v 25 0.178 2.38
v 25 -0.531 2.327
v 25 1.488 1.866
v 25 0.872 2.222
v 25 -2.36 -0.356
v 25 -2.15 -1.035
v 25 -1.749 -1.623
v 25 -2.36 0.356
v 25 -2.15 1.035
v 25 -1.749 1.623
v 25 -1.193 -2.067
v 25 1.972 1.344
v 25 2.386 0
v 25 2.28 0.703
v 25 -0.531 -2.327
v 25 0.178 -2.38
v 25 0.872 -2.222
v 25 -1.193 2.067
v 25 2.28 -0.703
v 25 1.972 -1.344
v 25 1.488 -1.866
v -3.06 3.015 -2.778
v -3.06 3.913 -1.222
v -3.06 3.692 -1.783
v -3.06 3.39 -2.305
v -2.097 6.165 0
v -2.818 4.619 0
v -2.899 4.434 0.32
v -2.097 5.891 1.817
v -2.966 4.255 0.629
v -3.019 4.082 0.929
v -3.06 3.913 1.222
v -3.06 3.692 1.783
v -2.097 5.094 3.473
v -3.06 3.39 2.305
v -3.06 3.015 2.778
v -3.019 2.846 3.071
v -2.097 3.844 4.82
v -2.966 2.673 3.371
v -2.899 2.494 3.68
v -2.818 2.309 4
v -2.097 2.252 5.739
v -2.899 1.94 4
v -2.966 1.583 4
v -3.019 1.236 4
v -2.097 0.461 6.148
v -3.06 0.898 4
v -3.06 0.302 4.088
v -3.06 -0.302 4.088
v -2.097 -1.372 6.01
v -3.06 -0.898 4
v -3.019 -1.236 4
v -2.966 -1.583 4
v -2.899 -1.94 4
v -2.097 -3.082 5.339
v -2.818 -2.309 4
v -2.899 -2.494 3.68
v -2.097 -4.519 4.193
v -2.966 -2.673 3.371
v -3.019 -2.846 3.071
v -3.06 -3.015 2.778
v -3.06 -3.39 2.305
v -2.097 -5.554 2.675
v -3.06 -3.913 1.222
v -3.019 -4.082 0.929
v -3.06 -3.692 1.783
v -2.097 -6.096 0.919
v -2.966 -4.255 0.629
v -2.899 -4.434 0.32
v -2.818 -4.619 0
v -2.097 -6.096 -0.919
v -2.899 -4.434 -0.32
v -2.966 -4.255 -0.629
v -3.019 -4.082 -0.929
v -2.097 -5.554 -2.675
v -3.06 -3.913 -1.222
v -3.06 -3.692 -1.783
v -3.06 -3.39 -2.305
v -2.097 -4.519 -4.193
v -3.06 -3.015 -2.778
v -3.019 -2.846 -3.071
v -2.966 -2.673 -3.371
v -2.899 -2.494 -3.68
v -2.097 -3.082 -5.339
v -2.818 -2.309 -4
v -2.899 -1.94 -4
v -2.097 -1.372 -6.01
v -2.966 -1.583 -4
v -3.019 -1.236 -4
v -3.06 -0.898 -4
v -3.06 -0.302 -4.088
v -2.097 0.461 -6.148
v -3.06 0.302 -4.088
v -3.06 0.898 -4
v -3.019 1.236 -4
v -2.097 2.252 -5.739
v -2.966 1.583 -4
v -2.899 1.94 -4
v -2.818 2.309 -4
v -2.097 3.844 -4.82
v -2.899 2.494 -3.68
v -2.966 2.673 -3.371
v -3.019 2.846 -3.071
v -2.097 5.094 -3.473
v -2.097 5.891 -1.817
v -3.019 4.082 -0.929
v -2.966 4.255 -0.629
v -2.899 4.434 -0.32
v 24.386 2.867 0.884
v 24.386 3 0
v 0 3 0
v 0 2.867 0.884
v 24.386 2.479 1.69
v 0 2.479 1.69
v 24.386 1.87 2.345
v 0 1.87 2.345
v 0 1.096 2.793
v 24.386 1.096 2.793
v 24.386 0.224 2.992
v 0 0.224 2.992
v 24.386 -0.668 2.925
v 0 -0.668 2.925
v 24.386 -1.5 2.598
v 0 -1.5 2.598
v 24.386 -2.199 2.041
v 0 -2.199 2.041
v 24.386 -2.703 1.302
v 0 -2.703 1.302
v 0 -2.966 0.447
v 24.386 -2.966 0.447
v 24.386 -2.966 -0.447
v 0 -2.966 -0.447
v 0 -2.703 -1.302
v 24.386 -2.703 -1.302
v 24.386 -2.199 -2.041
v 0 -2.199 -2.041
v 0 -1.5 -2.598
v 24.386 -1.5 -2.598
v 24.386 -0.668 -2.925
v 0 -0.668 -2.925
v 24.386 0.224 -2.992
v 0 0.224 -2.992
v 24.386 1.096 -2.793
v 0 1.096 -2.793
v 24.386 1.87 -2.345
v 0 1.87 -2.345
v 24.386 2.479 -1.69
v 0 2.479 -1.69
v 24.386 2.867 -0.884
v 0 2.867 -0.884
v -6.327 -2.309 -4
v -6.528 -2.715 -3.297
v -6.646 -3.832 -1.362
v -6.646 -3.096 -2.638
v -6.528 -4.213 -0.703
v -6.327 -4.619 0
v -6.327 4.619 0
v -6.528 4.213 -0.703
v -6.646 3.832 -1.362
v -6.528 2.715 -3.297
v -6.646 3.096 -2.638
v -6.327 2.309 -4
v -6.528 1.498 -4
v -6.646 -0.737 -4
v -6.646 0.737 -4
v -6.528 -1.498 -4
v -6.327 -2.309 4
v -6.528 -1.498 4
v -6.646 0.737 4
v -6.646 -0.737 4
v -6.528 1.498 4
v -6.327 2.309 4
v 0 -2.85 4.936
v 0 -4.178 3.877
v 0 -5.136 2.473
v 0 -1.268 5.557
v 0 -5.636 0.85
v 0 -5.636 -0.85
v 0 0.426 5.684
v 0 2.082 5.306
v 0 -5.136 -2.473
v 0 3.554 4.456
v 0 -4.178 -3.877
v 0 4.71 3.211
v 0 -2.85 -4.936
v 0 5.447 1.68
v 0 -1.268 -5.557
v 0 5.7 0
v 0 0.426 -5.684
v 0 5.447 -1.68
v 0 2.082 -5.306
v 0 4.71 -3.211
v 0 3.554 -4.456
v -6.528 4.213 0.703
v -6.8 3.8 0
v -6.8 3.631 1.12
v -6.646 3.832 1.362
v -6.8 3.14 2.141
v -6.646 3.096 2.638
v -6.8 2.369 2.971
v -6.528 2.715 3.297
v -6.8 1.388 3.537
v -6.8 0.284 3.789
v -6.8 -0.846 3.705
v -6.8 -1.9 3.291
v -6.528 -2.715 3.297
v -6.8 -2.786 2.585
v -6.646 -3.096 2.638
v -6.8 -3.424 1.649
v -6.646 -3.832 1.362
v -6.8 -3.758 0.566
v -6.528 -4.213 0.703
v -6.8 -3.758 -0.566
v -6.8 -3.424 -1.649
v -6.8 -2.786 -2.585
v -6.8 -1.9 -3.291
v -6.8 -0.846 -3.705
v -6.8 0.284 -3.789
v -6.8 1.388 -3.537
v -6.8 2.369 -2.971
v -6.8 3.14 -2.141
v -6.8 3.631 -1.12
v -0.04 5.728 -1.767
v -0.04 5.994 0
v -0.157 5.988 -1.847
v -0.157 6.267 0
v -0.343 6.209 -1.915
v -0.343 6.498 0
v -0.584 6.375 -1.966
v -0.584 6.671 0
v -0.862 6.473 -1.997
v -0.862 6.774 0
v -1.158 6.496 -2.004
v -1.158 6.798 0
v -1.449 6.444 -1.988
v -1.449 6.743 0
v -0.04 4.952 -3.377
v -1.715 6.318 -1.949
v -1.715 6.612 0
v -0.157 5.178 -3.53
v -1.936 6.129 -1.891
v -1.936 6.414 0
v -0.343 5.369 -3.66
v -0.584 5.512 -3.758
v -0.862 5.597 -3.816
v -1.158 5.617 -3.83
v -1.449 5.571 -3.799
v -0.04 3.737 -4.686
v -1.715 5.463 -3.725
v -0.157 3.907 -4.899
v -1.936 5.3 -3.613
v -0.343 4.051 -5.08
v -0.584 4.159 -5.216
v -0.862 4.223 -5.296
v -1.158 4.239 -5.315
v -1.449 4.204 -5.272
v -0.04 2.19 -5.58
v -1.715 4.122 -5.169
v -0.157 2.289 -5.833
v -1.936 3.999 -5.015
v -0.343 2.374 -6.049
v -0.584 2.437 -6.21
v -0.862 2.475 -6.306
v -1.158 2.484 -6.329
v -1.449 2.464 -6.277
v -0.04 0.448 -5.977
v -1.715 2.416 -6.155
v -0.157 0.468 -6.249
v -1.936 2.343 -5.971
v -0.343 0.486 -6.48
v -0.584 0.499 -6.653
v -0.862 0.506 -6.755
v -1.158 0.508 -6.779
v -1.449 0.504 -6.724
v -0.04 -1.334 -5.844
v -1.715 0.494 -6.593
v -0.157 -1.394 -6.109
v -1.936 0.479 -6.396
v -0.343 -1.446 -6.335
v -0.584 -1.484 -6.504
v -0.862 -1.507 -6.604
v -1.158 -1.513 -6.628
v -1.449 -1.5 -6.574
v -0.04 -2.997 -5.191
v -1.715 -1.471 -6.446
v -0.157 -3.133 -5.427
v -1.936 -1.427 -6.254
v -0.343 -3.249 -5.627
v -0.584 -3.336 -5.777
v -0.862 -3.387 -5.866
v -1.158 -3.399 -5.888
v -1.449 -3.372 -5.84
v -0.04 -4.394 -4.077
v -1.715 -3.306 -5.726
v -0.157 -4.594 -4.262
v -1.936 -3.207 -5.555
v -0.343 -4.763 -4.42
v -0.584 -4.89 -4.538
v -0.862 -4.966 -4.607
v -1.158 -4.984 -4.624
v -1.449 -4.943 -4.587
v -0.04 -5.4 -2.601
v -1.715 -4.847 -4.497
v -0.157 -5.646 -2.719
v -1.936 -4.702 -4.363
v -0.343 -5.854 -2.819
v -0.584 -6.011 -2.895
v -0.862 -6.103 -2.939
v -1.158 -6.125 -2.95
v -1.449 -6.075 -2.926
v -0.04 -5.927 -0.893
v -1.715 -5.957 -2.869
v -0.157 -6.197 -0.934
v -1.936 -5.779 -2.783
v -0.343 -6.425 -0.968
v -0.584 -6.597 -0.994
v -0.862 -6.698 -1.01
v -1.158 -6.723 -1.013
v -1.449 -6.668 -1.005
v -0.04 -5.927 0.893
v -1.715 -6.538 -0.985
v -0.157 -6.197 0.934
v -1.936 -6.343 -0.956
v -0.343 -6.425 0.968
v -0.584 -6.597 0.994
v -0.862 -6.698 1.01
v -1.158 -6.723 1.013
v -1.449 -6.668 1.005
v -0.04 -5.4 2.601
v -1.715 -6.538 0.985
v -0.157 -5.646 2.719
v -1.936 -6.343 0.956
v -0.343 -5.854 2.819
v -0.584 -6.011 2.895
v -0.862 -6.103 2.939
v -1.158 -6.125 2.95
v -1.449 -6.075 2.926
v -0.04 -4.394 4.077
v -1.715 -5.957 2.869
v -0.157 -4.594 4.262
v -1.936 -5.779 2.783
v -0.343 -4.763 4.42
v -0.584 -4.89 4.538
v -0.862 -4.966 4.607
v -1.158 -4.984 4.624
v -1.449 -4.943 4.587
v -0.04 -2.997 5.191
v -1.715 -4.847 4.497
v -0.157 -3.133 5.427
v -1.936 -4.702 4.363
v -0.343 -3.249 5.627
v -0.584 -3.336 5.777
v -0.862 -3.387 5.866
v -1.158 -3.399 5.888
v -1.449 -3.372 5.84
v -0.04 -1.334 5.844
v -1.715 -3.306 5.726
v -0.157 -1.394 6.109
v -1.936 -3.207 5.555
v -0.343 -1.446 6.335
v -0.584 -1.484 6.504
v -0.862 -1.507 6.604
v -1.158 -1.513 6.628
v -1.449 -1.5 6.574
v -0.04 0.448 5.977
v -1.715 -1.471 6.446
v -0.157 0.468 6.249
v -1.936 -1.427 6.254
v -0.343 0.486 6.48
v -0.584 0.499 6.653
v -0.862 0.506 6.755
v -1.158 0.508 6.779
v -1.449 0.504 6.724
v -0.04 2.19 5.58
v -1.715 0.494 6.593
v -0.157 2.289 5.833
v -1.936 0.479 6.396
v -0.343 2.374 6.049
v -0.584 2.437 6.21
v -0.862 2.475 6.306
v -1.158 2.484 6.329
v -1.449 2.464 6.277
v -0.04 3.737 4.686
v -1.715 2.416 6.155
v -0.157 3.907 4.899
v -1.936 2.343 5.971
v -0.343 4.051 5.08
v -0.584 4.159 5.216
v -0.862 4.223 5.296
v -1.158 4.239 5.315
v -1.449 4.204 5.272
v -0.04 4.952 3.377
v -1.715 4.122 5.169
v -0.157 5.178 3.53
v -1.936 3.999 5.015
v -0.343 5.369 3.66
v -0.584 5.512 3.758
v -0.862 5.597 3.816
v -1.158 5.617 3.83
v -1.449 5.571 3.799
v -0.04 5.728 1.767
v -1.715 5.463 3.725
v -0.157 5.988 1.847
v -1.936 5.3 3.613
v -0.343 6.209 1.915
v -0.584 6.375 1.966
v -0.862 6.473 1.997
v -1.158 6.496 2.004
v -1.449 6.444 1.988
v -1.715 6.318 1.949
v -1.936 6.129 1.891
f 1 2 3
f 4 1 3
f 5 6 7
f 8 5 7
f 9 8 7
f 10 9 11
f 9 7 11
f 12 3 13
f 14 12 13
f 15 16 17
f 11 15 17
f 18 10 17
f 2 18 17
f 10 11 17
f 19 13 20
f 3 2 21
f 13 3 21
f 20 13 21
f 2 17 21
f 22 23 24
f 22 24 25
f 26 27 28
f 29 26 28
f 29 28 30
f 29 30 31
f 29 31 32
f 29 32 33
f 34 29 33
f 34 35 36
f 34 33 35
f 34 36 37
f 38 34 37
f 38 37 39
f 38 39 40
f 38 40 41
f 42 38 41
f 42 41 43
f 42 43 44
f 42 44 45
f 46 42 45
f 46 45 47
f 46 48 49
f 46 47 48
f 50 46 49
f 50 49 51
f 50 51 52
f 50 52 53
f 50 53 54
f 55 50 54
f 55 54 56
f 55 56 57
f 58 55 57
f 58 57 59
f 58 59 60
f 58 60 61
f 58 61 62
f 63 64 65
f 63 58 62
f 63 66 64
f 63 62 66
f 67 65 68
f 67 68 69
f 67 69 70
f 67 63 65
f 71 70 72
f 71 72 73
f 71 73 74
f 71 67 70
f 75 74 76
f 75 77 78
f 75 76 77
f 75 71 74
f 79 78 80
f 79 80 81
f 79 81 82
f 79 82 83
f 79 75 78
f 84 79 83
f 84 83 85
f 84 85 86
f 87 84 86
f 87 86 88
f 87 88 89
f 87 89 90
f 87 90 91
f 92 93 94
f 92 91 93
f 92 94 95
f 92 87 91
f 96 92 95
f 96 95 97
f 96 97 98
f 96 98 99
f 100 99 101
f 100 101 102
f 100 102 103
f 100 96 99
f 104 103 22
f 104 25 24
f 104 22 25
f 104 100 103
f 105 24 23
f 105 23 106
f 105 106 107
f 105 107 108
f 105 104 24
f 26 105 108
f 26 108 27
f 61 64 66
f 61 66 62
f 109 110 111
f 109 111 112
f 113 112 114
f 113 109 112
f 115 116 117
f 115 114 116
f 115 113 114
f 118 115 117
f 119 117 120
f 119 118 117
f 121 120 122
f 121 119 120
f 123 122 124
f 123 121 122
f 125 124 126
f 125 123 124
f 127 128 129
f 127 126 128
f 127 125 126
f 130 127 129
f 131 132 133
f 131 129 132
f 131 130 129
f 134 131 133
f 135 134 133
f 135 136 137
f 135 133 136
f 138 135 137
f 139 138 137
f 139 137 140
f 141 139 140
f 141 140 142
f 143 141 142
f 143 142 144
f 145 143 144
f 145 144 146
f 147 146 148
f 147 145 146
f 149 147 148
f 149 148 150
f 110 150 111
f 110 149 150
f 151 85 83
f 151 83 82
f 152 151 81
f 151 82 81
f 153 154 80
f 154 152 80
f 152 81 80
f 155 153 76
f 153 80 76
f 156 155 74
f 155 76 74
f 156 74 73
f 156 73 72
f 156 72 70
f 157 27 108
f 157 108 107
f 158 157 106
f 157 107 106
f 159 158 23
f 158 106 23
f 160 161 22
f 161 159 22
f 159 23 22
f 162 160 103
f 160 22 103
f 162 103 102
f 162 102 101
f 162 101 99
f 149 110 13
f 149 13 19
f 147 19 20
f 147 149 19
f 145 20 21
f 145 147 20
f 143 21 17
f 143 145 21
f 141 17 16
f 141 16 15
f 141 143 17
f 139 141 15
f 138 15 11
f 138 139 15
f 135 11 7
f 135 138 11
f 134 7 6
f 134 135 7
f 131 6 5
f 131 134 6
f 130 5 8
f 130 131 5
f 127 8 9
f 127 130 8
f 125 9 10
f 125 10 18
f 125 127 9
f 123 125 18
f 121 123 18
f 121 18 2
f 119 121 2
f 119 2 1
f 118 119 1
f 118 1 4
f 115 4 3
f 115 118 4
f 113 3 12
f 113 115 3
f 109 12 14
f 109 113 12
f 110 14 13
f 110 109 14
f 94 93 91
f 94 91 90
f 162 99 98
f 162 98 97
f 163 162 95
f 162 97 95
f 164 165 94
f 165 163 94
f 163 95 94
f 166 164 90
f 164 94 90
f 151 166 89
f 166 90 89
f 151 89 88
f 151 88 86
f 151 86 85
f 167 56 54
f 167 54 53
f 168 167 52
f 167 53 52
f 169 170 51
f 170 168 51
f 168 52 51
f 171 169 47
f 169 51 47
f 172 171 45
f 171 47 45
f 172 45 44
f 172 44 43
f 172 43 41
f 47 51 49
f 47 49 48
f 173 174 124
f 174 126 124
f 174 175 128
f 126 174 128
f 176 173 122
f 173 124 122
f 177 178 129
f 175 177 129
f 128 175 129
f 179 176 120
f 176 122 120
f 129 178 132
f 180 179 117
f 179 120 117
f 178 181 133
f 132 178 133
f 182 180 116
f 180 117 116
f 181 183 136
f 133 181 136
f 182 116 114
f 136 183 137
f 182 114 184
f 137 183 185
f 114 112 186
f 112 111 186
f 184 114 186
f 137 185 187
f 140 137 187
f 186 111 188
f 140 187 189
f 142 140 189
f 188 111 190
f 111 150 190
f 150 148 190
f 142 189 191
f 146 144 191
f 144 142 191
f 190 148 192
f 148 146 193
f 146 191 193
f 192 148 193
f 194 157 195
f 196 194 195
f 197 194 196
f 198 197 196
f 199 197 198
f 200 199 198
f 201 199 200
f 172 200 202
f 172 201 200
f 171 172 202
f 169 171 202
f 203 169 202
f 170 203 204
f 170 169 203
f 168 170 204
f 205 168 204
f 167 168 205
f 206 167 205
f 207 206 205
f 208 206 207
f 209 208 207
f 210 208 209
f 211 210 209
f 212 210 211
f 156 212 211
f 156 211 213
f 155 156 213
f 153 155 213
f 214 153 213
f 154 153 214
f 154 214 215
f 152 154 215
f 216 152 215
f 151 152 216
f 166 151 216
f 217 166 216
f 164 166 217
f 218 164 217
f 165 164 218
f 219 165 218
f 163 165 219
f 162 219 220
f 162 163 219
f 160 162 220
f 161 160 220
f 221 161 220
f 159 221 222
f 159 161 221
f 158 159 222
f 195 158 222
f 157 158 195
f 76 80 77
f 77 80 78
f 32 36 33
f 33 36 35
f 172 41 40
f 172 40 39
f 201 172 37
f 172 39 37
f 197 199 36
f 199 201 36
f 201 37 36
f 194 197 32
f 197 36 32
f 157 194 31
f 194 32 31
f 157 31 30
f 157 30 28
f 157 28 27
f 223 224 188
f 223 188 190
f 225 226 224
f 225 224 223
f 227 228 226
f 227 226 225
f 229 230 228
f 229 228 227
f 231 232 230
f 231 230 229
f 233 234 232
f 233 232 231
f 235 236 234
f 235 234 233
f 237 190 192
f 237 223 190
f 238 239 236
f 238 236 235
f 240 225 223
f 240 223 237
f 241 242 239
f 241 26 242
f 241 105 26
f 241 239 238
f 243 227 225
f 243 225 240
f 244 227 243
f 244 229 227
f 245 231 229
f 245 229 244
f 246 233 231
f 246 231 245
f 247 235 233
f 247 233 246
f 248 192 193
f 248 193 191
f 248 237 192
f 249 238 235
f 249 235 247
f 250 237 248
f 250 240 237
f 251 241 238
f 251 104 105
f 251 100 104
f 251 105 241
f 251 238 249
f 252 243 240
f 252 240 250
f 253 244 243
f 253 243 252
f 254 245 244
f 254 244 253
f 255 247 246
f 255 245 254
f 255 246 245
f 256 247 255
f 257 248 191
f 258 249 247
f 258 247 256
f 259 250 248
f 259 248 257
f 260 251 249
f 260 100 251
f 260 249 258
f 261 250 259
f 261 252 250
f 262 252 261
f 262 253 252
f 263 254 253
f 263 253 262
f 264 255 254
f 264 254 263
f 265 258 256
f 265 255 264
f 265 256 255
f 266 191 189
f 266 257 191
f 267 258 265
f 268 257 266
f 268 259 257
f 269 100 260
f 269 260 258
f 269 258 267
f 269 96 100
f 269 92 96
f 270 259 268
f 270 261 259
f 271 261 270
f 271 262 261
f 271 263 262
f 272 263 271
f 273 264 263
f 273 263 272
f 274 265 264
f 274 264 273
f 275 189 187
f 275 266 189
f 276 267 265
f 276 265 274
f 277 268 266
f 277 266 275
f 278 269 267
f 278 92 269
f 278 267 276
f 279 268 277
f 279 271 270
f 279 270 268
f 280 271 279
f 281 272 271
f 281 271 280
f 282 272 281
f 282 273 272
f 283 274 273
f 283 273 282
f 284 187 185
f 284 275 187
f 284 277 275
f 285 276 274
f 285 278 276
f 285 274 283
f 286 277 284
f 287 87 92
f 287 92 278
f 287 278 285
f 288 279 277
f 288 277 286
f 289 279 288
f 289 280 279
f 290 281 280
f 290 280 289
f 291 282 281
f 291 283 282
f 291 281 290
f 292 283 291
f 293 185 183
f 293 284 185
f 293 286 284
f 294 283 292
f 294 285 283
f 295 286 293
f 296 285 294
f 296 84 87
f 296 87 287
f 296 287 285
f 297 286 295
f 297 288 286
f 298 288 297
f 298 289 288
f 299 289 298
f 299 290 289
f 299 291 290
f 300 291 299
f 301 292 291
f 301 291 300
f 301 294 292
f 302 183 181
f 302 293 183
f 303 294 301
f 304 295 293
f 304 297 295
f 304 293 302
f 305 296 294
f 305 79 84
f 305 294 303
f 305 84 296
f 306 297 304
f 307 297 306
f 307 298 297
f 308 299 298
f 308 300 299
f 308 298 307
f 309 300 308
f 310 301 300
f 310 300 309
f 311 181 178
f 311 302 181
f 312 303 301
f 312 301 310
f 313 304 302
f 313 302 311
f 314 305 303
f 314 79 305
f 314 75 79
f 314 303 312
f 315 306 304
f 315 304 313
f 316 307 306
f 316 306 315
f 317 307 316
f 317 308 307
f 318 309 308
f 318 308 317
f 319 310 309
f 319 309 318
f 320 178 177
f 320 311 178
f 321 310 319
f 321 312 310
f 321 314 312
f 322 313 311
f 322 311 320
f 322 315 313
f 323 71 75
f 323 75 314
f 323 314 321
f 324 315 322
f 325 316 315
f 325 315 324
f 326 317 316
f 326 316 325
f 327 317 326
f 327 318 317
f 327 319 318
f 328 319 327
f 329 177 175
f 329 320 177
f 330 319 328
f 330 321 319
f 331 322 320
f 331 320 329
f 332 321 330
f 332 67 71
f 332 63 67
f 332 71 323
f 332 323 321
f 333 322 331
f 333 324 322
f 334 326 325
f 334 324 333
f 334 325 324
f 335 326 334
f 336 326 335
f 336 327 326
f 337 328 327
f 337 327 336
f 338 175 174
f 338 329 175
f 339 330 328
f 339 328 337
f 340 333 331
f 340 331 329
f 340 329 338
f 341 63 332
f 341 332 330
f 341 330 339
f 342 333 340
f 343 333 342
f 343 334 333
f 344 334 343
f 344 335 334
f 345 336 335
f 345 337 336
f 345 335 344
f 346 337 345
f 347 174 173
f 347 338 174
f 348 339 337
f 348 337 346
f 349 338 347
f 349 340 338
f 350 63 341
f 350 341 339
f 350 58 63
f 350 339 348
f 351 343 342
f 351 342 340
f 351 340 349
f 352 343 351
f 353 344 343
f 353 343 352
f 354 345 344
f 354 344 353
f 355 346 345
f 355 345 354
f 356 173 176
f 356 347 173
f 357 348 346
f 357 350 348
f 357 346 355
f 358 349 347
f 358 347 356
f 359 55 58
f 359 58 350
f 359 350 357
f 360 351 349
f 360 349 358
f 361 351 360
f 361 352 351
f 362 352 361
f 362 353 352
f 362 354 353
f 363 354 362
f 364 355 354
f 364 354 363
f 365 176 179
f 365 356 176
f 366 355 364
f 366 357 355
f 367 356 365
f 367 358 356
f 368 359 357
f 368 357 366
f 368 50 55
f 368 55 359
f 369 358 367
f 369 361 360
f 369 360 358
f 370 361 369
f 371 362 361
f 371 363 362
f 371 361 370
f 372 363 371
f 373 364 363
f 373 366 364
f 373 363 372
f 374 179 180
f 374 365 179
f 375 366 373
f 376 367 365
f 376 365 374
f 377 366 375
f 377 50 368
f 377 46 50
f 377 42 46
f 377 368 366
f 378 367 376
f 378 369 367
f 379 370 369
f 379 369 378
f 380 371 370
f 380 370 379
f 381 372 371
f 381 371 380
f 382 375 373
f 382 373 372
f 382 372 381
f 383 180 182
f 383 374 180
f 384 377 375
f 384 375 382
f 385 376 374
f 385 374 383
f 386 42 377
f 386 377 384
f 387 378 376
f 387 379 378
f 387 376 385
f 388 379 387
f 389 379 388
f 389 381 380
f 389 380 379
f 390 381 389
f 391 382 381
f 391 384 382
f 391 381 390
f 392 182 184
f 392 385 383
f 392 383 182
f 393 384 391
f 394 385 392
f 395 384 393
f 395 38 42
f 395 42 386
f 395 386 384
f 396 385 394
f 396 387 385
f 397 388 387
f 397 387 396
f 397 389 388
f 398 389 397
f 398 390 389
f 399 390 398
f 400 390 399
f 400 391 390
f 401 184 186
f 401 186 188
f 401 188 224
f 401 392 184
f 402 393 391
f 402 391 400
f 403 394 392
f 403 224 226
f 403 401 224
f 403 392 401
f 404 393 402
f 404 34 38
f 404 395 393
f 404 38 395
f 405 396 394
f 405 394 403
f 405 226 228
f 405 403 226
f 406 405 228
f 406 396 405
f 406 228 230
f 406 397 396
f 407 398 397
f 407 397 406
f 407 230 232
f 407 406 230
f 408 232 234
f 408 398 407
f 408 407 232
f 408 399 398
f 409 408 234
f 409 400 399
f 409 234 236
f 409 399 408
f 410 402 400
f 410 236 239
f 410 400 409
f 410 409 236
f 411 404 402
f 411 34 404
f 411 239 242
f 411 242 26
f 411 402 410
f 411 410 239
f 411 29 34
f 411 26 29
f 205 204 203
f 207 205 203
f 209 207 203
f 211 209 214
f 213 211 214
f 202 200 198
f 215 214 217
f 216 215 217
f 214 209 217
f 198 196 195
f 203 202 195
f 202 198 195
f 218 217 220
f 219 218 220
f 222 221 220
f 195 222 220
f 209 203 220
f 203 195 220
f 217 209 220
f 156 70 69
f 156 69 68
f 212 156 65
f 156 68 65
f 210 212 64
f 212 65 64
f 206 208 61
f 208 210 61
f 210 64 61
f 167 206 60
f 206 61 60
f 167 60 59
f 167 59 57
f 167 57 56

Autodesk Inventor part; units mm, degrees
ref_plane "YZ Plane" through (0, 0, 0) normal (1, 0, 0) x (0, 1, 0)
ref_plane "XZ Plane" through (0, 0, 0) normal (0, 1, 0) x (-1, 0, 0)
sketch "Sketch1" plane through (0, 0, 0) normal (0, 0, 1) x (1, 0, 0)
  line L0 (-3.06, 0) -> (-3.06, 4.0996)
  line L1 (0, 5.7) -> (0, 3)
  line L2 (7, 3) -> (25, 3)
  line L3 (25, 3) -> (25, 0)
  line L4 (25, 0) -> (-3.06, 0)
  arc A0 (0, 5.7) -> (-2.0969, 6.1649) centre (-1.1, 5.7) ccw
  line L5 (0, -1.4013) -> (0, 8.4076) projected
  line L6 (-9.672, 0) -> (36.612, 0) projected
  line L7 (0, 3) -> (0.0001, 3)
  line L8 (0.0001, 3) -> (0.0001, 3)
  line L9 (0.0001, 3) -> (6.3865, 3)
  line L10 (6.3865, 3) -> (7, 3)
  line L11 (-3.06, 4.0996) -> (-2.0969, 6.1649)
  line L12 (0.0001, 3) -> (7, 3) construction
  line L13 (7, 3) -> (7, 0) construction
  dimension "d0" = 1.1
  dimension "d1" = 25
  dimension "d2" = 18
  dimension "d3" = 13.6
  dimension "d4" = 6
  dimension "d5" = 3.06
  dimension "d15" = 6
  dimension "d16" = 6
  dimension "d17" = 0.0001
  dimension "d18" = 0.6135
  dimension "d19" = 25
revolve "Body" add sketch "Sketch1" angle 360 about axis through (25, 0, 0) along (-1, 0, 0)
sketch "Sketch2" plane through (0, 0, 0) normal (1, 0, 0) x (0, 0, -1)
  line L0 (4, 2.3094) -> (4, -2.3094)
  line L1 (4, -2.3094) -> (0, -4.6188)
  line L2 (0, -4.6188) -> (-4, -2.3094)
  line L3 (-4, -2.3094) -> (-4, 2.3094)
  line L4 (-4, 2.3094) -> (0, 4.6188)
  line L5 (0, 4.6188) -> (4, 2.3094)
  point P0 (0, 0)
  point P1 (0, 0)
  dimension "d23" = 8
extrude "Head" add sketch "Sketch2" against normal blind 6.8
sketch "Sketch3" plane through (0, 0, 0) normal (0, 0, 1) x (1, 0, 0)
  line L0 (-6.8, 3.8) -> (-6.8, 4.6188)
  line L1 (-6.8, 4.6188) -> (-6.3273, 4.6188)
  line L2 (-6.3273, 4.6188) -> (-6.8, 3.8)
  line L3 (-7.5964, 0) -> (-2.0215, 0) projected
  line L4 (-6.8, 4.6188) -> (-6.8, 2.3094) projected
  line L5 (-2.8179, 4.6188) -> (-6.8, 4.6188) projected
  point P0 (-6.8, 2.3094)
  dimension "d8" = 30
  dimension "d22" = 7.6
revolve "Chamfer1" cut sketch "Sketch3" angle 360 about axis through (-10, 0, 0) along (1, 0, 0)
thread "Thread" size "M6x1" class "6g" standard "ISO Metric profile" length 18
chamfer "Chamfer2" distance 0.6135 distance2 0.6135 1 edges at (25, -3, 0) measured on face at (25, -0.9709, -0.2393)
ref_plane "Work Plane1" through (10.95, 0, 0) normal (0, 0, -1) x (1, 0, 0)
equation "\"d0\" = PHH"
equation "\"d1\" = NLG"
equation "\"d2\" = GEL"
equation "\"d3\" = LADI"
equation "\"d4\" = GD"
equation "\"d5\" = 0.45 * KOH"
equation "\"d15\" = SD2"
equation "\"d16\" = BDM"
equation "\"d18\" = GAL"
equation "\"d19\" = KEWI"
equation "\"d23\" = SW"
equation "\"d6\" = KOH"
equation "\"d8\" = ANG1"
equation "\"d22\" = SW0"
equation "\"d10\" = GEL"
equation "\"d13\" = -0.5 * SPD + 0.5 * GD"
equation "\"d14\" = GUL"
equation "\"NLG\" = 25"
equation "\"GD\" = NND"
equation "\"BDM\" = NND"
equation "\"KOH\" = 6.8"
equation "\"GEL\" = 18"
equation "\"LADI\" = 13.6"
equation "\"SW\" = 8"
equation "\"PHH\" = RR"
equation "\"SW0\" = 7.6"
equation "\"SPD\" = NND - 1.2269 * PTC"
equation "\"SD2\" = NND"
equation "\"SD\" = 0"
equation "\"ANG1\" = 30deg"
equation "\"KEWI\" = 25deg"
equation "\"GAL\" = 0.61345 * PTC"
equation "\"GUL\" = 0.61345 * PTC"
equation "\"PTC\" = 1"
equation "\"THREADDIA\" = 6"
equation "\"E0\" = 1.155 * SW"
equation "\"TOA\" = 30deg"
equation "\"NND\" = 6"
equation "\"GD1\" = THREADDIA - 1.2269 * PTC"
equation "\"SDH\" = SW"
equation "\"KOH1\" = 2.9"
equation "\"RR\" = 1.1"
properties part number "ISO 4162 - M6 x 30" material "Stainless Steel"
